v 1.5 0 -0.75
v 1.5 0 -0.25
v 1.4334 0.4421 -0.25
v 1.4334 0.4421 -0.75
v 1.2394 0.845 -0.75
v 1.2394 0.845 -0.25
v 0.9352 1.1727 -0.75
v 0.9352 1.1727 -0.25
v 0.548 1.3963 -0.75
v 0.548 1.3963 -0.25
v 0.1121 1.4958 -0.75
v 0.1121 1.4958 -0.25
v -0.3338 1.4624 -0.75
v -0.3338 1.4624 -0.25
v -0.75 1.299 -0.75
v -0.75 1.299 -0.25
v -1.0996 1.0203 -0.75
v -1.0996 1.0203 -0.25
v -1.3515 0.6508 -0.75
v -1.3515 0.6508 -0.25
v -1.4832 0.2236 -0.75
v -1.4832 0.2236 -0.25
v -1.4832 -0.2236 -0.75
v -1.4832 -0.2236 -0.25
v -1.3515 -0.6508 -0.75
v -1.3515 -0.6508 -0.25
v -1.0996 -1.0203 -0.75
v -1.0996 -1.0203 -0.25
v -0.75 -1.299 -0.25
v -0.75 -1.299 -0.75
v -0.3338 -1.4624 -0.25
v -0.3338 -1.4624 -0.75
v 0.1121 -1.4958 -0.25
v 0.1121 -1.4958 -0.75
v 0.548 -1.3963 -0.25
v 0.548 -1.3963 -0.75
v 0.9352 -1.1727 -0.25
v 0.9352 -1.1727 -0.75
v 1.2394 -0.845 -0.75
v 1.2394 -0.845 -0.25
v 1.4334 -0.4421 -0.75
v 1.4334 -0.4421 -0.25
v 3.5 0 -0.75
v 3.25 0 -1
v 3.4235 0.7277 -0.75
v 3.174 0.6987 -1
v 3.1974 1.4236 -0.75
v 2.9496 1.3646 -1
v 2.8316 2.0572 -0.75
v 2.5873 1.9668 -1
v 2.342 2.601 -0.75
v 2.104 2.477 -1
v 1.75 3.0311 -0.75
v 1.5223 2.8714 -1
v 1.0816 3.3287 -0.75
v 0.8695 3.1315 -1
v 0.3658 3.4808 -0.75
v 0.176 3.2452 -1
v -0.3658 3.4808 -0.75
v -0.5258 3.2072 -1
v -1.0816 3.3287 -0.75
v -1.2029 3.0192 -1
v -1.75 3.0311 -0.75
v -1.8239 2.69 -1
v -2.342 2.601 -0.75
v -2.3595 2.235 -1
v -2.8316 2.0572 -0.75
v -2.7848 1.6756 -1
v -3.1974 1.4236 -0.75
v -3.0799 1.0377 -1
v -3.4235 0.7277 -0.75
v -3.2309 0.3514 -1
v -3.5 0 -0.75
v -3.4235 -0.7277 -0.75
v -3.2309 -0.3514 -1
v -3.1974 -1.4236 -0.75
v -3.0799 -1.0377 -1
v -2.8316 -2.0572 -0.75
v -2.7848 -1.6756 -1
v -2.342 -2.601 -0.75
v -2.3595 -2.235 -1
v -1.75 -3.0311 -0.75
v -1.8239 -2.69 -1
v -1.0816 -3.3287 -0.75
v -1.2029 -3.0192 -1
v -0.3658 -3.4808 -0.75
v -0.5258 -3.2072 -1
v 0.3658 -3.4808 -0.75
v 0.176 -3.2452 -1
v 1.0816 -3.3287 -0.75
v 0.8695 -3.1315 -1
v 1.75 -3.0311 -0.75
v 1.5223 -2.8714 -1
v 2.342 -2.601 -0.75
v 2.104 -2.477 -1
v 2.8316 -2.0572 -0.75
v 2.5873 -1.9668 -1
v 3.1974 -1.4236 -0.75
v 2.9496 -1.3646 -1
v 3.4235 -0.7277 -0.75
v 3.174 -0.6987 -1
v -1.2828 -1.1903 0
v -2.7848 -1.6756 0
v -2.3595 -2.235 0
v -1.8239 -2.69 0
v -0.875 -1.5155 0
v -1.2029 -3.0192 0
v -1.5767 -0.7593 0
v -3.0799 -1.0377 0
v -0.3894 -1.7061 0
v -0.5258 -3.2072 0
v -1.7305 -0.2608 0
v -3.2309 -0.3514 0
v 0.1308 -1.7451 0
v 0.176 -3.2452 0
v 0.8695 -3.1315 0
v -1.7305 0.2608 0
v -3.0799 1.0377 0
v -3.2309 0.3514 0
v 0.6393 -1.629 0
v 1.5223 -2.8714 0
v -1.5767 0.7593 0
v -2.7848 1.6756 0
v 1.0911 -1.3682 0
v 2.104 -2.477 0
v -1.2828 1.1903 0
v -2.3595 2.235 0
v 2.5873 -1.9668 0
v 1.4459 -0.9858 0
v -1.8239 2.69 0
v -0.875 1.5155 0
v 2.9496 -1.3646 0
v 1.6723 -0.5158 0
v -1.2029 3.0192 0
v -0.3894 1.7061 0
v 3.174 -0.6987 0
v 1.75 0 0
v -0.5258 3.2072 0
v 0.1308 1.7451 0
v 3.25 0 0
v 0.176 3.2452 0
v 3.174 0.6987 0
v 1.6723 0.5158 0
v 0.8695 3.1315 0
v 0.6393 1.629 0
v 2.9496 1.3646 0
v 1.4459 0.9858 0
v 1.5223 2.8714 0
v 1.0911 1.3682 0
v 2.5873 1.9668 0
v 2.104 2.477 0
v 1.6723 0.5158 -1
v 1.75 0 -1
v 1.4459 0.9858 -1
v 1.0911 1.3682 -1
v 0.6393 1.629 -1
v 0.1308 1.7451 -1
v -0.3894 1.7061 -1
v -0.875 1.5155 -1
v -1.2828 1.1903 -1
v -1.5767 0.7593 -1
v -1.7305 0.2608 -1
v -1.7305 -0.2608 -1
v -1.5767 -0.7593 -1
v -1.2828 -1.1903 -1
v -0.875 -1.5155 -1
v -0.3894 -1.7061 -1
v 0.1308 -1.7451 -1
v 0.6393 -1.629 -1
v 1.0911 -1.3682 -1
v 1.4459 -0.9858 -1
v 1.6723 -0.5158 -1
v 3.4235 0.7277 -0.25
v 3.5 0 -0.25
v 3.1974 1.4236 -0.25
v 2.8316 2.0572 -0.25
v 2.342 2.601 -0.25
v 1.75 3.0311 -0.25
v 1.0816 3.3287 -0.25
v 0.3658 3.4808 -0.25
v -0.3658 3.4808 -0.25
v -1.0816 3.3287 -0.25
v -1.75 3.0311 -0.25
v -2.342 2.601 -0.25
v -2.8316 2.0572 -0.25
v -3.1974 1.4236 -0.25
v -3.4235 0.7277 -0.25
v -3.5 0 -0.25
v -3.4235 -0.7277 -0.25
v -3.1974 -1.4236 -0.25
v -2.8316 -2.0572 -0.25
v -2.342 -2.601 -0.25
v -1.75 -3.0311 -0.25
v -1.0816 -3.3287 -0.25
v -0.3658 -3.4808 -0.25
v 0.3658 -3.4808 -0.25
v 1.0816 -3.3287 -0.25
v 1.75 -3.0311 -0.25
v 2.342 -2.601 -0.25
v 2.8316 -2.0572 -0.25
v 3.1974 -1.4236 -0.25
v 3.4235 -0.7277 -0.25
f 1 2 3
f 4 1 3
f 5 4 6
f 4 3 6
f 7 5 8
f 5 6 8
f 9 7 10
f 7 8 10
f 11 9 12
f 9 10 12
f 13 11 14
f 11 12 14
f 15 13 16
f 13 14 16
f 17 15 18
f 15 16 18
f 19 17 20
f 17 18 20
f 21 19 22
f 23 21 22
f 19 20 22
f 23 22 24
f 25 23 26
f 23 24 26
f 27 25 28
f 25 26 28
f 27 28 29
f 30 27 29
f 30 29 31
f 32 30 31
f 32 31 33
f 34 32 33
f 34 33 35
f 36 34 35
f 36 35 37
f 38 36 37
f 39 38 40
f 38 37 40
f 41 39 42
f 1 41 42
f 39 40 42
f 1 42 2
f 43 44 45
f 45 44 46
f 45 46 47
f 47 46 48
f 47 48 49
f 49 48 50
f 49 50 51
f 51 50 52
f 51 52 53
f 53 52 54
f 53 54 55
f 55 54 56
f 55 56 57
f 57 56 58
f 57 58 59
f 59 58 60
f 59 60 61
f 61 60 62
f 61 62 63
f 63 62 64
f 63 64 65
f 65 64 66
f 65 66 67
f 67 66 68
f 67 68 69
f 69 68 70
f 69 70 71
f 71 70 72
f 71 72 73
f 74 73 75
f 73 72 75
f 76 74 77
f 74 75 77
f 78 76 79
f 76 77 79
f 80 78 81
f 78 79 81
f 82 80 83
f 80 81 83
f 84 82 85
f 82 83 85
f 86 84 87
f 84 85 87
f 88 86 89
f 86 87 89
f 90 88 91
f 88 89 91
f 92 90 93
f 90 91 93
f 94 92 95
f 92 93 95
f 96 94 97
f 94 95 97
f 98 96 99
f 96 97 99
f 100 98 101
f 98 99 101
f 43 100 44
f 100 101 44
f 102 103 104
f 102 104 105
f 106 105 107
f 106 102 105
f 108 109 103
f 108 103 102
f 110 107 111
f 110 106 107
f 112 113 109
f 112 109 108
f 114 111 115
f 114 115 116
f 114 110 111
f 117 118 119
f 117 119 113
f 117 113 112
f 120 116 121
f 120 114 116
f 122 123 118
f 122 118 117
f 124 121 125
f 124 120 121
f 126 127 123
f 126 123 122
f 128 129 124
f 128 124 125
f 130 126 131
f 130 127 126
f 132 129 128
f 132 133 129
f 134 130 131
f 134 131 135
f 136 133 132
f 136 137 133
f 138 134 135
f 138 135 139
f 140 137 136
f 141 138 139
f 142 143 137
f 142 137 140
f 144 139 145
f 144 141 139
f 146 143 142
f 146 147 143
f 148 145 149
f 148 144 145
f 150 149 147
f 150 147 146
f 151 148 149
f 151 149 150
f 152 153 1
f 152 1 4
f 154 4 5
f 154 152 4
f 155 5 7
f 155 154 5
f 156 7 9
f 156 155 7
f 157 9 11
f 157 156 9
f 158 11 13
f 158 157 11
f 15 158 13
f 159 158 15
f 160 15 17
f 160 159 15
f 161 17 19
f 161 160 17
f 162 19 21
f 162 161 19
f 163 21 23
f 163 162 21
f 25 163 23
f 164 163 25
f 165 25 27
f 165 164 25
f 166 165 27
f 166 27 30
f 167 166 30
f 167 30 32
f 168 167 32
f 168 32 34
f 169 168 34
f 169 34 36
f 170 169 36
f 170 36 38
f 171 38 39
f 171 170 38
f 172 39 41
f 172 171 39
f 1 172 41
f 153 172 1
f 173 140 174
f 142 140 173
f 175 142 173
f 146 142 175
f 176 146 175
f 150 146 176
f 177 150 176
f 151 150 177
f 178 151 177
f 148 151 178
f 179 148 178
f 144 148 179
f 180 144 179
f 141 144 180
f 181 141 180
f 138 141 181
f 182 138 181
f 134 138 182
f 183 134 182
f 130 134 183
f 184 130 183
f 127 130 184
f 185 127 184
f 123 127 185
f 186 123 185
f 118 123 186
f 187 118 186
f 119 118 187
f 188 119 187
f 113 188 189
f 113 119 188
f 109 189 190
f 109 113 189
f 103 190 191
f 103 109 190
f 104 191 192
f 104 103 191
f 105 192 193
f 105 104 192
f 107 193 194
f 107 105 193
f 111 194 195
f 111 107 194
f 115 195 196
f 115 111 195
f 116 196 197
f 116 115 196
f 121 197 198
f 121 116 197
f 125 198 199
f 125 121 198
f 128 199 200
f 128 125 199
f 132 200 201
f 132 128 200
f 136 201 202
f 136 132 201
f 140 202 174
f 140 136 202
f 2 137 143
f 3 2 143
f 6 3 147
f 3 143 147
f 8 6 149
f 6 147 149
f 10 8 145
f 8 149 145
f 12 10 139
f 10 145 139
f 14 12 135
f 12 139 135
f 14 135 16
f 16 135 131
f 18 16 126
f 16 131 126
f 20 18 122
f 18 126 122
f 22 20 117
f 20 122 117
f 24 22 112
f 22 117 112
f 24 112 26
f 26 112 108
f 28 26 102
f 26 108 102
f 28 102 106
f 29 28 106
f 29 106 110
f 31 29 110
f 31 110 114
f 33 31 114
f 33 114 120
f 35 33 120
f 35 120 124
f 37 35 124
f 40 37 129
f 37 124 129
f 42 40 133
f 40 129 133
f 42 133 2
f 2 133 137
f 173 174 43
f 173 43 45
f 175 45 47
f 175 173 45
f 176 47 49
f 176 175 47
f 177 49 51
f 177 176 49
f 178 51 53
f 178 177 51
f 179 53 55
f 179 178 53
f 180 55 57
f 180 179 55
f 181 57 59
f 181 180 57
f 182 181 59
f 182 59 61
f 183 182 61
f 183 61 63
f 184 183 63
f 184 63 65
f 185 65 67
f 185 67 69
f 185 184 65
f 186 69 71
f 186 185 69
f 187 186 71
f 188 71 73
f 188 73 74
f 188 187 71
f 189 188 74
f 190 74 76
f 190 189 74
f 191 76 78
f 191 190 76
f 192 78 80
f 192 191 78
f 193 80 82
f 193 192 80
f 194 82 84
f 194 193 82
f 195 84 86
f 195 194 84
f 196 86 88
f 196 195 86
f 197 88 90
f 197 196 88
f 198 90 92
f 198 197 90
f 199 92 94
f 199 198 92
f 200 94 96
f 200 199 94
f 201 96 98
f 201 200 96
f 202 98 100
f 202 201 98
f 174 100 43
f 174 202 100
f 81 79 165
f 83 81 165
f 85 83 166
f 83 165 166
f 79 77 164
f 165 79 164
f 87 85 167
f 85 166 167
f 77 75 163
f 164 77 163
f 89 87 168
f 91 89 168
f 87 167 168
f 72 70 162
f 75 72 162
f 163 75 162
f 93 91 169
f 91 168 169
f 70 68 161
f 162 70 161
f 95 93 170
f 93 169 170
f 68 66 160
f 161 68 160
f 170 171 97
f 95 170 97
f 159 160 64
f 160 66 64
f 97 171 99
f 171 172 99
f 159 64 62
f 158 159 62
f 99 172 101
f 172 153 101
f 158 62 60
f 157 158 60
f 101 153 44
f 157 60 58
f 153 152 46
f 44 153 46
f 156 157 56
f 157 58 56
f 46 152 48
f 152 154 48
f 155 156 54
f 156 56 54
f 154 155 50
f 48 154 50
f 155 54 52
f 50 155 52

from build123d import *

# Parameters (mm, degrees)
SKETCH2_R          = 3.5
SKETCH2_R_2        = 1.5
BASE_FLANGE1_DEPTH = 1
CHAMFER1_SIZE      = 0.25


# Sheet-metal steps are written as plain solids
with BuildPart() as part:
    # Sketch2 → Base-Flange1 (new body)
    with BuildSketch(Plane.XY):
        Circle(SKETCH2_R)
        Circle(SKETCH2_R_2, mode=Mode.SUBTRACT)
    extrude(amount=-BASE_FLANGE1_DEPTH)

    # Chamfer1
    chamfer1_edges = [part.edges().sort_by_distance(p)[0] for p in [
        (-3.5, 0, 0),
        (-3.5, 0, -1),
        (-1.5, 0, -1),
        (-1.5, 0, 0),
    ]]
    chamfer(chamfer1_edges, length=CHAMFER1_SIZE)


solid = part.part
